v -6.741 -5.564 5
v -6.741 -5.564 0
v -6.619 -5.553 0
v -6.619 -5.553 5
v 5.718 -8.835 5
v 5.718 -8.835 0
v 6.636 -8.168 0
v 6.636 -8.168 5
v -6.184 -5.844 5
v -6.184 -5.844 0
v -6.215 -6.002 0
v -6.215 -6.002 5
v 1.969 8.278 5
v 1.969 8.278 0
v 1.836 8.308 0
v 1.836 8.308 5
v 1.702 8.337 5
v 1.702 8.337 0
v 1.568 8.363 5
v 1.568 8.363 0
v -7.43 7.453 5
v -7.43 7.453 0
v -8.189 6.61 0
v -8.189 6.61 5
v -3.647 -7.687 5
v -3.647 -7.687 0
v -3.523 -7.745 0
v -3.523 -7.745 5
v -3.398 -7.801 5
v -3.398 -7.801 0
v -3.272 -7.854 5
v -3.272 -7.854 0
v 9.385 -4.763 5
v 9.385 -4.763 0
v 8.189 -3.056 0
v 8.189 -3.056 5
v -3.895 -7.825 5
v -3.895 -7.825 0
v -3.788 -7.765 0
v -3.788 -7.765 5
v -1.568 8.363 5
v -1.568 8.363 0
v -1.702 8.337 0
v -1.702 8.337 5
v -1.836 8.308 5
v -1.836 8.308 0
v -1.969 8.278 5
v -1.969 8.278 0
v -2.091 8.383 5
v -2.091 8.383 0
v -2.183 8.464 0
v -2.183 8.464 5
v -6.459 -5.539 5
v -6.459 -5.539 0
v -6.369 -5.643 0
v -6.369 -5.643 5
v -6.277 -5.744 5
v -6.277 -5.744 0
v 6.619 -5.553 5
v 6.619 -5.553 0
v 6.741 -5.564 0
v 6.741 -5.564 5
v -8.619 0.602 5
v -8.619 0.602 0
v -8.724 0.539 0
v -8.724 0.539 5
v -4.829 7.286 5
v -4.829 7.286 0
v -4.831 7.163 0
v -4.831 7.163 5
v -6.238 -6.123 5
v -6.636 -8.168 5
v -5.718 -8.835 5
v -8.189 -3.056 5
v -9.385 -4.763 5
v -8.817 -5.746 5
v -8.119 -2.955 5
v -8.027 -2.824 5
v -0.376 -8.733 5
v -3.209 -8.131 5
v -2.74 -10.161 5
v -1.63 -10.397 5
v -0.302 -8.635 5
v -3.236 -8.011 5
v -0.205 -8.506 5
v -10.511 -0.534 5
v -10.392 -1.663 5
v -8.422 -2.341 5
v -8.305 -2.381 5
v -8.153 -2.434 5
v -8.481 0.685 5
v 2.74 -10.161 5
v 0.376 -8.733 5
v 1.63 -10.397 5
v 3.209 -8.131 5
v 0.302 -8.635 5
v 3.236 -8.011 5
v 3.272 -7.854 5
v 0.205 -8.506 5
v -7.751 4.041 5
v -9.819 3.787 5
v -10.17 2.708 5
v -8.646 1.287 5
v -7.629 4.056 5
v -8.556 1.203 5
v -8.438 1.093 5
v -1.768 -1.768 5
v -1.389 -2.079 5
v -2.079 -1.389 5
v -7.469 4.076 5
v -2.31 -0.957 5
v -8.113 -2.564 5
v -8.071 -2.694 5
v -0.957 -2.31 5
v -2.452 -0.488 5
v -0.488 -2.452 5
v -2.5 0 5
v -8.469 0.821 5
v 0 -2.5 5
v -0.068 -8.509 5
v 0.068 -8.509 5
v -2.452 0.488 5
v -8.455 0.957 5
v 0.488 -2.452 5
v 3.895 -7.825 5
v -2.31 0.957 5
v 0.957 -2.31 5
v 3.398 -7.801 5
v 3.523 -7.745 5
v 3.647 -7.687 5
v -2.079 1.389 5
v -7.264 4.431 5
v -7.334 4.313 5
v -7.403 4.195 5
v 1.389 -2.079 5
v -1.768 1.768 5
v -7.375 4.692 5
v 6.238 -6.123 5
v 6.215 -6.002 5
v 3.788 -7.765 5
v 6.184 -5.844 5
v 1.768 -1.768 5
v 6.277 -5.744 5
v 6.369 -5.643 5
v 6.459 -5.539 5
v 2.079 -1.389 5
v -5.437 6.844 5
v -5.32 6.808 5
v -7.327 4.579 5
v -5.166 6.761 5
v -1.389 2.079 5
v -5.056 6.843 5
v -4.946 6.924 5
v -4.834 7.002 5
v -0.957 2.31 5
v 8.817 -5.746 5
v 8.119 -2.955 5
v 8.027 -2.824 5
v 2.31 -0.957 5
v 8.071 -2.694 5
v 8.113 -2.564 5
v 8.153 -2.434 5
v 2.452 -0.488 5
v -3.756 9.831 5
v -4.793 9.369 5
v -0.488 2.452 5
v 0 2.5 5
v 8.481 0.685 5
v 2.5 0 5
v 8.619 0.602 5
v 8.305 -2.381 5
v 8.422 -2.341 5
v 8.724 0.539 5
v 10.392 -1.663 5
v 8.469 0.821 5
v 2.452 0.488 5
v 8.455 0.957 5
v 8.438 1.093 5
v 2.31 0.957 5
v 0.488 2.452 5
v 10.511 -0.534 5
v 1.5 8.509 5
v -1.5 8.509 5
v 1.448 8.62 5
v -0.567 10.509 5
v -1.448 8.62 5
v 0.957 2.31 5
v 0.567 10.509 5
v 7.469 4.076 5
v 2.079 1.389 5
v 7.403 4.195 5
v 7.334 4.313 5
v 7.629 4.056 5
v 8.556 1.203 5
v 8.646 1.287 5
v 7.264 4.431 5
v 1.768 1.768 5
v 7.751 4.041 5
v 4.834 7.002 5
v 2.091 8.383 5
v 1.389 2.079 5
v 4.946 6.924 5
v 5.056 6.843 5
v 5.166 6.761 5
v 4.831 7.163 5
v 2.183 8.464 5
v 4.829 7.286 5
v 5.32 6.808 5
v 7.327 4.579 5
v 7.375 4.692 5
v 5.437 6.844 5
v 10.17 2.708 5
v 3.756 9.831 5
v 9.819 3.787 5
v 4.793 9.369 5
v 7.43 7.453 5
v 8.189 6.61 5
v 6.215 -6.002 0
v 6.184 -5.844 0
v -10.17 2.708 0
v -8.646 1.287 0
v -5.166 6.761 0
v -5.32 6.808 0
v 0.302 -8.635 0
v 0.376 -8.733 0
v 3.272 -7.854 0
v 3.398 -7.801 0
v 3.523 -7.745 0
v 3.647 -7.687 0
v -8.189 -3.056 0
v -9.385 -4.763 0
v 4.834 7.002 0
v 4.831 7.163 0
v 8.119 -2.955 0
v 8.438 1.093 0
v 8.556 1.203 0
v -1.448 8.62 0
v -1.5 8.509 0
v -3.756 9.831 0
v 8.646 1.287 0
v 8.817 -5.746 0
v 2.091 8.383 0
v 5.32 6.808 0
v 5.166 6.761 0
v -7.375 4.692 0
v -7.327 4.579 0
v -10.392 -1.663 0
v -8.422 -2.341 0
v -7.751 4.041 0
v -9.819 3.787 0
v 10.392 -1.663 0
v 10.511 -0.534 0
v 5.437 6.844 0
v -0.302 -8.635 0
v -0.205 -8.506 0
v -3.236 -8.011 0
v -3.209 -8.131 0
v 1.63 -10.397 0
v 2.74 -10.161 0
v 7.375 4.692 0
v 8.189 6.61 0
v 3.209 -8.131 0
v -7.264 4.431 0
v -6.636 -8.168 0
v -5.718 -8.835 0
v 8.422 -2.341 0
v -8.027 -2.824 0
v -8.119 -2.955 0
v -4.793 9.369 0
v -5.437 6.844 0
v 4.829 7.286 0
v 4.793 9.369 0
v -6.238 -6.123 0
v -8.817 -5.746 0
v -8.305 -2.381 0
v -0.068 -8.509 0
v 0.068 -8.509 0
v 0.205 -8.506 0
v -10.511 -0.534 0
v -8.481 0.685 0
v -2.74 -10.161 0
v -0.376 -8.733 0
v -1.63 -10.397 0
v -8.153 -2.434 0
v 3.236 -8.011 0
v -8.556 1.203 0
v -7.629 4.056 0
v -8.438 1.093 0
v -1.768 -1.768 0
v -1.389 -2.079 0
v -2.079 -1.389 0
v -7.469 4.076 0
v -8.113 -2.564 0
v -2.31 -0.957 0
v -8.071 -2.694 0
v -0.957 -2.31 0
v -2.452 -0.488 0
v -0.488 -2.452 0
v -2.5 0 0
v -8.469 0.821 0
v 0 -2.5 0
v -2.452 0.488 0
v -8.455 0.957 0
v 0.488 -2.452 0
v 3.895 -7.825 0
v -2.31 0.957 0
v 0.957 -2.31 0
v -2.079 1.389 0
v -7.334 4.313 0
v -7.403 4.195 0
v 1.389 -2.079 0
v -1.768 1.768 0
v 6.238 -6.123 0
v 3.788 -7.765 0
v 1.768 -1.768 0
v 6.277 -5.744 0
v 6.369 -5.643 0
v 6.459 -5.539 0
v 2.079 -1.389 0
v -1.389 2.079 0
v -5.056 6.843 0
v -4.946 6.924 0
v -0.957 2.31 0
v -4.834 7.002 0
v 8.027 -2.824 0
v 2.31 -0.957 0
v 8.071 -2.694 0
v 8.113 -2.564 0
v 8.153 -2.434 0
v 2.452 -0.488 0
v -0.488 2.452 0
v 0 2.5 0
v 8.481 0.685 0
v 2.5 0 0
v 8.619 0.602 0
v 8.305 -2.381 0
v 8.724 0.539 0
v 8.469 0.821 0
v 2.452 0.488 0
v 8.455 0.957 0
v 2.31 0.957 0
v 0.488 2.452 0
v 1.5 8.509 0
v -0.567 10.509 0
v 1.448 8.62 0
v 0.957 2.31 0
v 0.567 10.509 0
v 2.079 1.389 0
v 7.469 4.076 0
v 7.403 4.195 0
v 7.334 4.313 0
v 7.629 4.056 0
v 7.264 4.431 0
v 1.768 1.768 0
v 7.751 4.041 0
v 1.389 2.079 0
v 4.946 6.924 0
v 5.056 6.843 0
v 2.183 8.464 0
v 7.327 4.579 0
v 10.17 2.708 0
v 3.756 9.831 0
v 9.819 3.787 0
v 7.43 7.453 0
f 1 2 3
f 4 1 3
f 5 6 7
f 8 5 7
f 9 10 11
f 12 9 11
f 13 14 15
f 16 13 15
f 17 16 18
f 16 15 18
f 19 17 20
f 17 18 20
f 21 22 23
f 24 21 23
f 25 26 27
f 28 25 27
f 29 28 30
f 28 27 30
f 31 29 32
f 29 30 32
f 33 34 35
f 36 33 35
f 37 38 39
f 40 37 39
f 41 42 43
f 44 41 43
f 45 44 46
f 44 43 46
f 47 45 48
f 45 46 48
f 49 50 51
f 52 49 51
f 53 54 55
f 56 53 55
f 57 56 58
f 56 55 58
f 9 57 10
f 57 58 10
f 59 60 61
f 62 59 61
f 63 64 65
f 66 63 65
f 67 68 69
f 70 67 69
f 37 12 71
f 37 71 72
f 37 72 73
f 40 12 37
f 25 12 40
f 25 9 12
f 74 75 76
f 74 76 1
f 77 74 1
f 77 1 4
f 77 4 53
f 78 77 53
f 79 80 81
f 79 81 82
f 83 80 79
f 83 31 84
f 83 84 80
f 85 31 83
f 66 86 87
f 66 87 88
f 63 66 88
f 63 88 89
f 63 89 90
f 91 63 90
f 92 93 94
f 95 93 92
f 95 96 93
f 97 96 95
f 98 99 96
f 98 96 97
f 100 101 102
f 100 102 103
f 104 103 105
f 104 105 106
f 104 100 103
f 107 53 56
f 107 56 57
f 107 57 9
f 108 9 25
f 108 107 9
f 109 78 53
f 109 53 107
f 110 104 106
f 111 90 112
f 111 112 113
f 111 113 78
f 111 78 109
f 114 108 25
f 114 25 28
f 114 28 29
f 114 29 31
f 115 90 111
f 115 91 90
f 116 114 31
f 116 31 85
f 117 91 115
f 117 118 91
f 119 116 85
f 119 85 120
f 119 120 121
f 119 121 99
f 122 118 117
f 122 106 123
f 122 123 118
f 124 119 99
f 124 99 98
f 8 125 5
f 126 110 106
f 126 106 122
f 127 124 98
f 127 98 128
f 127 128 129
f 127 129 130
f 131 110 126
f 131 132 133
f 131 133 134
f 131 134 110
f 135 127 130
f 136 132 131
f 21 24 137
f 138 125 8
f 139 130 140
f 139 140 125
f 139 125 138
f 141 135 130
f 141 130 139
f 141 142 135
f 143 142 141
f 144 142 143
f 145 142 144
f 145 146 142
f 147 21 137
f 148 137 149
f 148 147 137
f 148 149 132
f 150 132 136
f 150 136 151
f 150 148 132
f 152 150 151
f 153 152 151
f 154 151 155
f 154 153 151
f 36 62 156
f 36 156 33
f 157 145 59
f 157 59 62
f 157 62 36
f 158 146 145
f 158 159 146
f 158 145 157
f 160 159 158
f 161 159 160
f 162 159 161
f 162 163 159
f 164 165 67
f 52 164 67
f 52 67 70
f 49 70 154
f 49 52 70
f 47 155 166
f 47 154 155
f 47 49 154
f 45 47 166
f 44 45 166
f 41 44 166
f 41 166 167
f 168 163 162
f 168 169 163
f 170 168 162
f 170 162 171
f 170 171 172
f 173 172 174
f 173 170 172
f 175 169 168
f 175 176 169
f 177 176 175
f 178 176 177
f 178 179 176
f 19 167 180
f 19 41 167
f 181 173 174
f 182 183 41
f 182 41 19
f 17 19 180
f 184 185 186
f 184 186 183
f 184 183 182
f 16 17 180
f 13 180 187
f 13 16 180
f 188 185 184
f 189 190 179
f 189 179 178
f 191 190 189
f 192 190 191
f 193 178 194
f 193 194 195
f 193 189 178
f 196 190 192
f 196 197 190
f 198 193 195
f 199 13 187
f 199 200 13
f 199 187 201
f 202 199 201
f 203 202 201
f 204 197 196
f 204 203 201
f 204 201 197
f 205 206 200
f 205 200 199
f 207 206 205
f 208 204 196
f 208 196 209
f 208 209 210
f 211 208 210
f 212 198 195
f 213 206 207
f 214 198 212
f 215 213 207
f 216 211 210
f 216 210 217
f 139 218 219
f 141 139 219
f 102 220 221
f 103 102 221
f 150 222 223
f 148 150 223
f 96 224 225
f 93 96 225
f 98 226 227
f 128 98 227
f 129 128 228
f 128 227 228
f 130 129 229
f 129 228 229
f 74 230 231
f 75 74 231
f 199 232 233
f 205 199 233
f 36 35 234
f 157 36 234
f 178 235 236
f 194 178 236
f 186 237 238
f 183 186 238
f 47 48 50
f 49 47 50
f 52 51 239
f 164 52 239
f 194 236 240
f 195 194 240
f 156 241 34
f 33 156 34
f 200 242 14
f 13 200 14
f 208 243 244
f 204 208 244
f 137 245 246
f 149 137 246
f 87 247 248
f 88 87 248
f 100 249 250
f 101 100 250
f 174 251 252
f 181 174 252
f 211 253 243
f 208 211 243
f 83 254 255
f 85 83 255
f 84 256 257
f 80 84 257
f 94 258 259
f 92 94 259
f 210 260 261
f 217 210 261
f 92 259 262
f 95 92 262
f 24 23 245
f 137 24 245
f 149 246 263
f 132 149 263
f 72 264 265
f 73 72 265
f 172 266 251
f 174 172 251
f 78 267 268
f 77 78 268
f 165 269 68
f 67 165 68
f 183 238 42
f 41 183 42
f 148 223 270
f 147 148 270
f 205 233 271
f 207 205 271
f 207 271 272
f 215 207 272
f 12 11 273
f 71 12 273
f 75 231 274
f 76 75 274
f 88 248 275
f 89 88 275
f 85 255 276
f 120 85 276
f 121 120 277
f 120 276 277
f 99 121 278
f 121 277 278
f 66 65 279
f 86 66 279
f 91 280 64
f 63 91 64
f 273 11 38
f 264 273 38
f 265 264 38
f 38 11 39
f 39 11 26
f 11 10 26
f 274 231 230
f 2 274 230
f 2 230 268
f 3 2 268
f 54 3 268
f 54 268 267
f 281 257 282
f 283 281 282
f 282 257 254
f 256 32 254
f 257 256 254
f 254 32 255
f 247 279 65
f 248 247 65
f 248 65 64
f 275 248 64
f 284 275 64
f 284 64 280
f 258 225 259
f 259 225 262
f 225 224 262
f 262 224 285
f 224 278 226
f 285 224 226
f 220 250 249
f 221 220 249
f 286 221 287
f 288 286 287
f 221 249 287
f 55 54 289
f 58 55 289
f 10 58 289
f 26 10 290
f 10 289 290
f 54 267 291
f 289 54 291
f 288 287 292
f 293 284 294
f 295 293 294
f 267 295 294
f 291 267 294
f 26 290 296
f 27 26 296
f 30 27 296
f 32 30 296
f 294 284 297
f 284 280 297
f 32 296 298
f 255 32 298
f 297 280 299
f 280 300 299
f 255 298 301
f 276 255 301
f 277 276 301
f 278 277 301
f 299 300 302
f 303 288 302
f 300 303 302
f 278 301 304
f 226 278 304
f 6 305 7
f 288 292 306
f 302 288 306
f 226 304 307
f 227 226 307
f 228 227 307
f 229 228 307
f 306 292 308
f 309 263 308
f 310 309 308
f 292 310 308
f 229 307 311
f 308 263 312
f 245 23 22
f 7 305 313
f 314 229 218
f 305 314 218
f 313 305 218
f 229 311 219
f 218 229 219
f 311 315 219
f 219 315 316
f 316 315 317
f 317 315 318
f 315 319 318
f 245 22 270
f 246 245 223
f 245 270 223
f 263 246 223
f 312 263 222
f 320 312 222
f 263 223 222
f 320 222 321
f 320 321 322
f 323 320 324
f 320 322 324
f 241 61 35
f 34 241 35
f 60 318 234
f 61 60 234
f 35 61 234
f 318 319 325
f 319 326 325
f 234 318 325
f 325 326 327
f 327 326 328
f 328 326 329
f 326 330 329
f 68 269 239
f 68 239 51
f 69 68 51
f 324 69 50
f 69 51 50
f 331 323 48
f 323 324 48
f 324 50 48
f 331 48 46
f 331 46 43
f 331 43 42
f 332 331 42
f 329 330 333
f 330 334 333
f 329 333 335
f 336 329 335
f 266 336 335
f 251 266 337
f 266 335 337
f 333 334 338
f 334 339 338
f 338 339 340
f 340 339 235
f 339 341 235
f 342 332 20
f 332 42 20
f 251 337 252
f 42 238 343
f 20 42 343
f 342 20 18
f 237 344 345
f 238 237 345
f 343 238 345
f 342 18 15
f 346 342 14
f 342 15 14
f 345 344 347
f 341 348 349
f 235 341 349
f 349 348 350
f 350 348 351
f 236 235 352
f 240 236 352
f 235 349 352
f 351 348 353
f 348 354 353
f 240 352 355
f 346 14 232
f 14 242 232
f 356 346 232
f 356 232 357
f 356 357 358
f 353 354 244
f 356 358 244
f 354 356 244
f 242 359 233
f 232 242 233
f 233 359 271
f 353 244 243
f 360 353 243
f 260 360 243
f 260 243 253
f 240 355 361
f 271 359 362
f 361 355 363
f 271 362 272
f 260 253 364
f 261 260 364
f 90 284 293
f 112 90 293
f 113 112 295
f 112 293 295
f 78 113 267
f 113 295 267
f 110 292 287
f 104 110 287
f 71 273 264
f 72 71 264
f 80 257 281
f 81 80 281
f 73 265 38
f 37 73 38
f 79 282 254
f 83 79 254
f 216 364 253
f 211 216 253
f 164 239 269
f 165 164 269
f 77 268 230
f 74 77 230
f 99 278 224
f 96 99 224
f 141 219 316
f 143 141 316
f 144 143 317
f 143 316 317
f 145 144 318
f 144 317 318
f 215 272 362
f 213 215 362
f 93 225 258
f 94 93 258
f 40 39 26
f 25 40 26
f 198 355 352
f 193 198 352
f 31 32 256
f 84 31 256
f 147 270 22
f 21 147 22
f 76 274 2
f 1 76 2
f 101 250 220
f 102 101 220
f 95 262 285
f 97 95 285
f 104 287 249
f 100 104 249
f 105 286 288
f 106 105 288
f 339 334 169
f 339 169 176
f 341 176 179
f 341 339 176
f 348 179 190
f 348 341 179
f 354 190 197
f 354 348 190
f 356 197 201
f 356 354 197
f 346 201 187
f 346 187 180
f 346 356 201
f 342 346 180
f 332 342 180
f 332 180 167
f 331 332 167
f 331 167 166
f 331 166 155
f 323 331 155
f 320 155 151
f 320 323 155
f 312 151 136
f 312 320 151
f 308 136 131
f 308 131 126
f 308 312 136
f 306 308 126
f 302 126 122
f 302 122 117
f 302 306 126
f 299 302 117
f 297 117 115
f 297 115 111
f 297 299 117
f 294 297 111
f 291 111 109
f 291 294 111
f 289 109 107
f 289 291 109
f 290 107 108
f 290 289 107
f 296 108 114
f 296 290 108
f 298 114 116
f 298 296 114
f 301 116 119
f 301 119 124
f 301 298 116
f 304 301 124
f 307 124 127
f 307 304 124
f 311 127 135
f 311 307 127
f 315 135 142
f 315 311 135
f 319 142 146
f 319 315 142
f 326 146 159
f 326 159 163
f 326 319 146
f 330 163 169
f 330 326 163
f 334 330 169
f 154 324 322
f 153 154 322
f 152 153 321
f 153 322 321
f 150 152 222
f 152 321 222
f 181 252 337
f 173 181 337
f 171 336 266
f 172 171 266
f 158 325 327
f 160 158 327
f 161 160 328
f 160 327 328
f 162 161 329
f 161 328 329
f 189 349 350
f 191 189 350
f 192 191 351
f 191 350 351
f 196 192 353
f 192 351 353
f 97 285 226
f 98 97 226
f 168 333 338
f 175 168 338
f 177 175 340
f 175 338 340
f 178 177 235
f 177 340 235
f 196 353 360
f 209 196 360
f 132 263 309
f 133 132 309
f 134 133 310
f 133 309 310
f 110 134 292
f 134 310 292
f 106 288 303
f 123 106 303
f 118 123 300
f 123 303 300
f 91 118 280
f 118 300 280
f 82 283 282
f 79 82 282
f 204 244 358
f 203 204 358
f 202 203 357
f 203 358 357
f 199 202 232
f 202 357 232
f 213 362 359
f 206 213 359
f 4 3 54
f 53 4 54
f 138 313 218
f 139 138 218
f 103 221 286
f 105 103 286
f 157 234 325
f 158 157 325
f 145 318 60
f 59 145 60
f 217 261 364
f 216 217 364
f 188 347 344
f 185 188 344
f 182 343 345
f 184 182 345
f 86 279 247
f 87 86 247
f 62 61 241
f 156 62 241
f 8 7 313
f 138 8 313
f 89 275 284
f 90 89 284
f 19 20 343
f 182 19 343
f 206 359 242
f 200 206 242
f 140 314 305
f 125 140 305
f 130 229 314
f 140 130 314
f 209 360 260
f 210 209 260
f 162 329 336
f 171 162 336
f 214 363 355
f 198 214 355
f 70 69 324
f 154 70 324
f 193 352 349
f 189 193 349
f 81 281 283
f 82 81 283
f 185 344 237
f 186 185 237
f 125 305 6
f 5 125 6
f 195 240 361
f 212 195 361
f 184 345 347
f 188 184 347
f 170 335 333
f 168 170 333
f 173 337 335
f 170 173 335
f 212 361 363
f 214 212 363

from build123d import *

# Parameters (mm, degrees)
SKETCH1_R           = 2.5
BOSS_EXTRUDE1_DEPTH = 5


with BuildPart() as part:
    # Sketch1 → Boss-Extrude1 (new body)
    with BuildSketch(Plane.XY):
        with BuildLine():
            Line((4.833962587, 7.00231299), (4.831156642, 7.163065475))
            Line((4.831156642, 7.163065475), (4.829008435, 7.286136175))
            Line((4.829008435, 7.286136175), (4.792643442, 9.369485213))
            Line((4.792643442, 9.369485213), (3.755980041, 9.831037496))
            Line((3.755980041, 9.831037496), (2.183417054, 8.464029347))
            Line((2.183417054, 8.464029347), (2.090520269, 8.383275404))
            Line((2.090520269, 8.383275404), (1.969180348, 8.27779622))
            ThreePointArc((1.969180348, 8.27779622), (1.769077823, 8.32285679), (1.567947285, 8.36308094))
            Line((1.567947285, 8.36308094), (1.5, 8.508794362))
            Line((1.5, 8.508794362), (1.447980152, 8.620351287))
            Line((1.447980152, 8.620351287), (0.567384684, 10.508794362))
            Line((0.567384684, 10.508794362), (-0.567384684, 10.508794362))
            Line((-0.567384684, 10.508794362), (-1.447980152, 8.620351287))
            Line((-1.447980152, 8.620351287), (-1.5, 8.508794362))
            Line((-1.5, 8.508794362), (-1.567947285, 8.36308094))
            ThreePointArc((-1.567947285, 8.36308094), (-1.769077823, 8.32285679), (-1.969180348, 8.27779622))
            Line((-1.969180348, 8.27779622), (-2.090520269, 8.383275404))
            Line((-2.090520269, 8.383275404), (-2.183417054, 8.464029347))
            Line((-2.183417054, 8.464029347), (-3.755980041, 9.831037496))
            Line((-3.755980041, 9.831037496), (-4.792643442, 9.369485213))
            Line((-4.792643442, 9.369485213), (-4.829008435, 7.286136175))
            Line((-4.829008435, 7.286136175), (-4.831156642, 7.163065475))
            Line((-4.831156642, 7.163065475), (-4.833962587, 7.00231299))
            ThreePointArc((-4.833962587, 7.00231299), (-5.001343841, 6.883759241), (-5.165818808, 6.761205332))
            Line((-5.165818808, 6.761205332), (-5.319570592, 6.808211969))
            Line((-5.319570592, 6.808211969), (-5.437281616, 6.844199841))
            Line((-5.437281616, 6.844199841), (-7.429901695, 7.453404935))
            Line((-7.429901695, 7.453404935), (-8.18921061, 6.610106952))
            Line((-8.18921061, 6.610106952), (-7.375057289, 4.692081926))
            Line((-7.375057289, 4.692081926), (-7.326962411, 4.578777493))
            Line((-7.326962411, 4.578777493), (-7.264141843, 4.430781509))
            ThreePointArc((-7.264141843, 4.430781509), (-7.368832073, 4.254397181), (-7.469240267, 4.075540618))
            Line((-7.469240267, 4.075540618), (-7.628818832, 4.055946834))
            Line((-7.628818832, 4.055946834), (-7.75099079, 4.040946004))
            Line((-7.75099079, 4.040946004), (-9.819125847, 3.787010949))
            Line((-9.819125847, 3.787010949), (-10.169788866, 2.707781148))
            Line((-10.169788866, 2.707781148), (-8.645891738, 1.286724086))
            Line((-8.645891738, 1.286724086), (-8.555869815, 1.202777285))
            Line((-8.555869815, 1.202777285), (-8.438284981, 1.093127654))
            ThreePointArc((-8.438284981, 1.093127654), (-8.462182296, 0.889411199), (-8.481162228, 0.685177906))
            Line((-8.481162228, 0.685177906), (-8.618974991, 0.602371644))
            Line((-8.618974991, 0.602371644), (-8.724483241, 0.538975892))
            Line((-8.724483241, 0.538975892), (-10.510533936, -0.534191634))
            Line((-10.510533936, -0.534191634), (-10.391918238, -1.662744616))
            Line((-10.391918238, -1.662744616), (-8.42177296, -2.341120038))
            Line((-8.42177296, -2.341120038), (-8.305389601, -2.381194042))
            Line((-8.305389601, -2.381194042), (-8.153371987, -2.433537904))
            ThreePointArc((-8.153371987, -2.433537904), (-8.092344324, -2.62936206), (-8.02661419, -2.82365829))
            Line((-8.02661419, -2.82365829), (-8.118832073, -2.955359075))
            Line((-8.118832073, -2.955359075), (-8.18943328, -3.056188048))
            Line((-8.18943328, -3.056188048), (-9.384575223, -4.763027631))
            Line((-9.384575223, -4.763027631), (-8.817190539, -5.745766731))
            Line((-8.817190539, -5.745766731), (-6.741453128, -5.564163239))
            Line((-6.741453128, -5.564163239), (-6.618832073, -5.553435287))
            Line((-6.618832073, -5.553435287), (-6.458666906, -5.53942265))
            ThreePointArc((-6.458666906, -5.53942265), (-6.323266501, -5.693494731), (-6.18419164, -5.844258315))
            Line((-6.18419164, -5.844258315), (-6.214869332, -6.002081362))
            Line((-6.214869332, -6.002081362), (-6.238355906, -6.12290931))
            Line((-6.238355906, -6.12290931), (-6.635938197, -8.16829288))
            Line((-6.635938197, -8.16829288), (-5.717890494, -8.835293579))
            Line((-5.717890494, -8.835293579), (-3.895474806, -7.825112067))
            Line((-3.895474806, -7.825112067), (-3.787818349, -7.765437119))
            Line((-3.787818349, -7.765437119), (-3.647199641, -7.687490896))
            ThreePointArc((-3.647199641, -7.687490896), (-3.460838455, -7.773170439), (-3.272466173, -7.854332985))
            Line((-3.272466173, -7.854332985), (-3.236299224, -8.010989254))
            Line((-3.236299224, -8.010989254), (-3.208610123, -8.130923927))
            Line((-3.208610123, -8.130923927), (-2.739887171, -10.161186083))
            Line((-2.739887171, -10.161186083), (-1.629915237, -10.397117901))
            Line((-1.629915237, -10.397117901), (-0.3759335, -8.73302793))
            Line((-0.3759335, -8.73302793), (-0.301856422, -8.634724327))
            Line((-0.301856422, -8.634724327), (-0.205098424, -8.506322127))
            ThreePointArc((-0.205098424, -8.506322127), (0, -8.508794362), (0.205098424, -8.506322127))
            Line((0.205098424, -8.506322127), (0.301856422, -8.634724327))
            Line((0.301856422, -8.634724327), (0.3759335, -8.73302793))
            Line((0.3759335, -8.73302793), (1.629915237, -10.397117901))
            Line((1.629915237, -10.397117901), (2.739887171, -10.161186083))
            Line((2.739887171, -10.161186083), (3.208610123, -8.130923927))
            Line((3.208610123, -8.130923927), (3.236299224, -8.010989254))
            Line((3.236299224, -8.010989254), (3.272466173, -7.854332985))
            ThreePointArc((3.272466173, -7.854332985), (3.460838455, -7.773170439), (3.647199641, -7.687490896))
            Line((3.647199641, -7.687490896), (3.787818349, -7.765437119))
            Line((3.787818349, -7.765437119), (3.895474806, -7.825112067))
            Line((3.895474806, -7.825112067), (5.717890494, -8.835293579))
            Line((5.717890494, -8.835293579), (6.635938197, -8.16829288))
            Line((6.635938197, -8.16829288), (6.238355906, -6.12290931))
            Line((6.238355906, -6.12290931), (6.214869332, -6.002081362))
            Line((6.214869332, -6.002081362), (6.18419164, -5.844258315))
            ThreePointArc((6.18419164, -5.844258315), (6.323266501, -5.693494731), (6.458666906, -5.53942265))
            Line((6.458666906, -5.53942265), (6.618832073, -5.553435287))
            Line((6.618832073, -5.553435287), (6.741453128, -5.564163239))
            Line((6.741453128, -5.564163239), (8.817190539, -5.745766731))
            Line((8.817190539, -5.745766731), (9.384575223, -4.763027631))
            Line((9.384575223, -4.763027631), (8.18943328, -3.056188048))
            Line((8.18943328, -3.056188048), (8.118832073, -2.955359075))
            Line((8.118832073, -2.955359075), (8.02661419, -2.82365829))
            ThreePointArc((8.02661419, -2.82365829), (8.092344324, -2.62936206), (8.153371987, -2.433537904))
            Line((8.153371987, -2.433537904), (8.305389601, -2.381194042))
            Line((8.305389601, -2.381194042), (8.42177296, -2.341120038))
            Line((8.42177296, -2.341120038), (10.391918238, -1.662744616))
            Line((10.391918238, -1.662744616), (10.510533936, -0.534191634))
            Line((10.510533936, -0.534191634), (8.724483241, 0.538975892))
            Line((8.724483241, 0.538975892), (8.618974991, 0.602371644))
            Line((8.618974991, 0.602371644), (8.481162228, 0.685177906))
            ThreePointArc((8.481162228, 0.685177906), (8.462182296, 0.889411199), (8.438284981, 1.093127654))
            Line((8.438284981, 1.093127654), (8.555869815, 1.202777285))
            Line((8.555869815, 1.202777285), (8.645891738, 1.286724086))
            Line((8.645891738, 1.286724086), (10.169788866, 2.707781148))
            Line((10.169788866, 2.707781148), (9.819125847, 3.787010949))
            Line((9.819125847, 3.787010949), (7.75099079, 4.040946004))
            Line((7.75099079, 4.040946004), (7.628818832, 4.055946834))
            Line((7.628818832, 4.055946834), (7.469240267, 4.075540618))
            ThreePointArc((7.469240267, 4.075540618), (7.368832073, 4.254397181), (7.264141843, 4.430781509))
            Line((7.264141843, 4.430781509), (7.326962411, 4.578777493))
            Line((7.326962411, 4.578777493), (7.375057289, 4.692081926))
            Line((7.375057289, 4.692081926), (8.18921061, 6.610106952))
            Line((8.18921061, 6.610106952), (7.429901695, 7.453404935))
            Line((7.429901695, 7.453404935), (5.437281616, 6.844199841))
            Line((5.437281616, 6.844199841), (5.319570592, 6.808211969))
            Line((5.319570592, 6.808211969), (5.165818808, 6.761205332))
            ThreePointArc((5.165818808, 6.761205332), (5.001343841, 6.883759241), (4.833962587, 7.00231299))
        make_face()
        Circle(SKETCH1_R, mode=Mode.SUBTRACT)
    extrude(amount=BOSS_EXTRUDE1_DEPTH)


solid = part.part
